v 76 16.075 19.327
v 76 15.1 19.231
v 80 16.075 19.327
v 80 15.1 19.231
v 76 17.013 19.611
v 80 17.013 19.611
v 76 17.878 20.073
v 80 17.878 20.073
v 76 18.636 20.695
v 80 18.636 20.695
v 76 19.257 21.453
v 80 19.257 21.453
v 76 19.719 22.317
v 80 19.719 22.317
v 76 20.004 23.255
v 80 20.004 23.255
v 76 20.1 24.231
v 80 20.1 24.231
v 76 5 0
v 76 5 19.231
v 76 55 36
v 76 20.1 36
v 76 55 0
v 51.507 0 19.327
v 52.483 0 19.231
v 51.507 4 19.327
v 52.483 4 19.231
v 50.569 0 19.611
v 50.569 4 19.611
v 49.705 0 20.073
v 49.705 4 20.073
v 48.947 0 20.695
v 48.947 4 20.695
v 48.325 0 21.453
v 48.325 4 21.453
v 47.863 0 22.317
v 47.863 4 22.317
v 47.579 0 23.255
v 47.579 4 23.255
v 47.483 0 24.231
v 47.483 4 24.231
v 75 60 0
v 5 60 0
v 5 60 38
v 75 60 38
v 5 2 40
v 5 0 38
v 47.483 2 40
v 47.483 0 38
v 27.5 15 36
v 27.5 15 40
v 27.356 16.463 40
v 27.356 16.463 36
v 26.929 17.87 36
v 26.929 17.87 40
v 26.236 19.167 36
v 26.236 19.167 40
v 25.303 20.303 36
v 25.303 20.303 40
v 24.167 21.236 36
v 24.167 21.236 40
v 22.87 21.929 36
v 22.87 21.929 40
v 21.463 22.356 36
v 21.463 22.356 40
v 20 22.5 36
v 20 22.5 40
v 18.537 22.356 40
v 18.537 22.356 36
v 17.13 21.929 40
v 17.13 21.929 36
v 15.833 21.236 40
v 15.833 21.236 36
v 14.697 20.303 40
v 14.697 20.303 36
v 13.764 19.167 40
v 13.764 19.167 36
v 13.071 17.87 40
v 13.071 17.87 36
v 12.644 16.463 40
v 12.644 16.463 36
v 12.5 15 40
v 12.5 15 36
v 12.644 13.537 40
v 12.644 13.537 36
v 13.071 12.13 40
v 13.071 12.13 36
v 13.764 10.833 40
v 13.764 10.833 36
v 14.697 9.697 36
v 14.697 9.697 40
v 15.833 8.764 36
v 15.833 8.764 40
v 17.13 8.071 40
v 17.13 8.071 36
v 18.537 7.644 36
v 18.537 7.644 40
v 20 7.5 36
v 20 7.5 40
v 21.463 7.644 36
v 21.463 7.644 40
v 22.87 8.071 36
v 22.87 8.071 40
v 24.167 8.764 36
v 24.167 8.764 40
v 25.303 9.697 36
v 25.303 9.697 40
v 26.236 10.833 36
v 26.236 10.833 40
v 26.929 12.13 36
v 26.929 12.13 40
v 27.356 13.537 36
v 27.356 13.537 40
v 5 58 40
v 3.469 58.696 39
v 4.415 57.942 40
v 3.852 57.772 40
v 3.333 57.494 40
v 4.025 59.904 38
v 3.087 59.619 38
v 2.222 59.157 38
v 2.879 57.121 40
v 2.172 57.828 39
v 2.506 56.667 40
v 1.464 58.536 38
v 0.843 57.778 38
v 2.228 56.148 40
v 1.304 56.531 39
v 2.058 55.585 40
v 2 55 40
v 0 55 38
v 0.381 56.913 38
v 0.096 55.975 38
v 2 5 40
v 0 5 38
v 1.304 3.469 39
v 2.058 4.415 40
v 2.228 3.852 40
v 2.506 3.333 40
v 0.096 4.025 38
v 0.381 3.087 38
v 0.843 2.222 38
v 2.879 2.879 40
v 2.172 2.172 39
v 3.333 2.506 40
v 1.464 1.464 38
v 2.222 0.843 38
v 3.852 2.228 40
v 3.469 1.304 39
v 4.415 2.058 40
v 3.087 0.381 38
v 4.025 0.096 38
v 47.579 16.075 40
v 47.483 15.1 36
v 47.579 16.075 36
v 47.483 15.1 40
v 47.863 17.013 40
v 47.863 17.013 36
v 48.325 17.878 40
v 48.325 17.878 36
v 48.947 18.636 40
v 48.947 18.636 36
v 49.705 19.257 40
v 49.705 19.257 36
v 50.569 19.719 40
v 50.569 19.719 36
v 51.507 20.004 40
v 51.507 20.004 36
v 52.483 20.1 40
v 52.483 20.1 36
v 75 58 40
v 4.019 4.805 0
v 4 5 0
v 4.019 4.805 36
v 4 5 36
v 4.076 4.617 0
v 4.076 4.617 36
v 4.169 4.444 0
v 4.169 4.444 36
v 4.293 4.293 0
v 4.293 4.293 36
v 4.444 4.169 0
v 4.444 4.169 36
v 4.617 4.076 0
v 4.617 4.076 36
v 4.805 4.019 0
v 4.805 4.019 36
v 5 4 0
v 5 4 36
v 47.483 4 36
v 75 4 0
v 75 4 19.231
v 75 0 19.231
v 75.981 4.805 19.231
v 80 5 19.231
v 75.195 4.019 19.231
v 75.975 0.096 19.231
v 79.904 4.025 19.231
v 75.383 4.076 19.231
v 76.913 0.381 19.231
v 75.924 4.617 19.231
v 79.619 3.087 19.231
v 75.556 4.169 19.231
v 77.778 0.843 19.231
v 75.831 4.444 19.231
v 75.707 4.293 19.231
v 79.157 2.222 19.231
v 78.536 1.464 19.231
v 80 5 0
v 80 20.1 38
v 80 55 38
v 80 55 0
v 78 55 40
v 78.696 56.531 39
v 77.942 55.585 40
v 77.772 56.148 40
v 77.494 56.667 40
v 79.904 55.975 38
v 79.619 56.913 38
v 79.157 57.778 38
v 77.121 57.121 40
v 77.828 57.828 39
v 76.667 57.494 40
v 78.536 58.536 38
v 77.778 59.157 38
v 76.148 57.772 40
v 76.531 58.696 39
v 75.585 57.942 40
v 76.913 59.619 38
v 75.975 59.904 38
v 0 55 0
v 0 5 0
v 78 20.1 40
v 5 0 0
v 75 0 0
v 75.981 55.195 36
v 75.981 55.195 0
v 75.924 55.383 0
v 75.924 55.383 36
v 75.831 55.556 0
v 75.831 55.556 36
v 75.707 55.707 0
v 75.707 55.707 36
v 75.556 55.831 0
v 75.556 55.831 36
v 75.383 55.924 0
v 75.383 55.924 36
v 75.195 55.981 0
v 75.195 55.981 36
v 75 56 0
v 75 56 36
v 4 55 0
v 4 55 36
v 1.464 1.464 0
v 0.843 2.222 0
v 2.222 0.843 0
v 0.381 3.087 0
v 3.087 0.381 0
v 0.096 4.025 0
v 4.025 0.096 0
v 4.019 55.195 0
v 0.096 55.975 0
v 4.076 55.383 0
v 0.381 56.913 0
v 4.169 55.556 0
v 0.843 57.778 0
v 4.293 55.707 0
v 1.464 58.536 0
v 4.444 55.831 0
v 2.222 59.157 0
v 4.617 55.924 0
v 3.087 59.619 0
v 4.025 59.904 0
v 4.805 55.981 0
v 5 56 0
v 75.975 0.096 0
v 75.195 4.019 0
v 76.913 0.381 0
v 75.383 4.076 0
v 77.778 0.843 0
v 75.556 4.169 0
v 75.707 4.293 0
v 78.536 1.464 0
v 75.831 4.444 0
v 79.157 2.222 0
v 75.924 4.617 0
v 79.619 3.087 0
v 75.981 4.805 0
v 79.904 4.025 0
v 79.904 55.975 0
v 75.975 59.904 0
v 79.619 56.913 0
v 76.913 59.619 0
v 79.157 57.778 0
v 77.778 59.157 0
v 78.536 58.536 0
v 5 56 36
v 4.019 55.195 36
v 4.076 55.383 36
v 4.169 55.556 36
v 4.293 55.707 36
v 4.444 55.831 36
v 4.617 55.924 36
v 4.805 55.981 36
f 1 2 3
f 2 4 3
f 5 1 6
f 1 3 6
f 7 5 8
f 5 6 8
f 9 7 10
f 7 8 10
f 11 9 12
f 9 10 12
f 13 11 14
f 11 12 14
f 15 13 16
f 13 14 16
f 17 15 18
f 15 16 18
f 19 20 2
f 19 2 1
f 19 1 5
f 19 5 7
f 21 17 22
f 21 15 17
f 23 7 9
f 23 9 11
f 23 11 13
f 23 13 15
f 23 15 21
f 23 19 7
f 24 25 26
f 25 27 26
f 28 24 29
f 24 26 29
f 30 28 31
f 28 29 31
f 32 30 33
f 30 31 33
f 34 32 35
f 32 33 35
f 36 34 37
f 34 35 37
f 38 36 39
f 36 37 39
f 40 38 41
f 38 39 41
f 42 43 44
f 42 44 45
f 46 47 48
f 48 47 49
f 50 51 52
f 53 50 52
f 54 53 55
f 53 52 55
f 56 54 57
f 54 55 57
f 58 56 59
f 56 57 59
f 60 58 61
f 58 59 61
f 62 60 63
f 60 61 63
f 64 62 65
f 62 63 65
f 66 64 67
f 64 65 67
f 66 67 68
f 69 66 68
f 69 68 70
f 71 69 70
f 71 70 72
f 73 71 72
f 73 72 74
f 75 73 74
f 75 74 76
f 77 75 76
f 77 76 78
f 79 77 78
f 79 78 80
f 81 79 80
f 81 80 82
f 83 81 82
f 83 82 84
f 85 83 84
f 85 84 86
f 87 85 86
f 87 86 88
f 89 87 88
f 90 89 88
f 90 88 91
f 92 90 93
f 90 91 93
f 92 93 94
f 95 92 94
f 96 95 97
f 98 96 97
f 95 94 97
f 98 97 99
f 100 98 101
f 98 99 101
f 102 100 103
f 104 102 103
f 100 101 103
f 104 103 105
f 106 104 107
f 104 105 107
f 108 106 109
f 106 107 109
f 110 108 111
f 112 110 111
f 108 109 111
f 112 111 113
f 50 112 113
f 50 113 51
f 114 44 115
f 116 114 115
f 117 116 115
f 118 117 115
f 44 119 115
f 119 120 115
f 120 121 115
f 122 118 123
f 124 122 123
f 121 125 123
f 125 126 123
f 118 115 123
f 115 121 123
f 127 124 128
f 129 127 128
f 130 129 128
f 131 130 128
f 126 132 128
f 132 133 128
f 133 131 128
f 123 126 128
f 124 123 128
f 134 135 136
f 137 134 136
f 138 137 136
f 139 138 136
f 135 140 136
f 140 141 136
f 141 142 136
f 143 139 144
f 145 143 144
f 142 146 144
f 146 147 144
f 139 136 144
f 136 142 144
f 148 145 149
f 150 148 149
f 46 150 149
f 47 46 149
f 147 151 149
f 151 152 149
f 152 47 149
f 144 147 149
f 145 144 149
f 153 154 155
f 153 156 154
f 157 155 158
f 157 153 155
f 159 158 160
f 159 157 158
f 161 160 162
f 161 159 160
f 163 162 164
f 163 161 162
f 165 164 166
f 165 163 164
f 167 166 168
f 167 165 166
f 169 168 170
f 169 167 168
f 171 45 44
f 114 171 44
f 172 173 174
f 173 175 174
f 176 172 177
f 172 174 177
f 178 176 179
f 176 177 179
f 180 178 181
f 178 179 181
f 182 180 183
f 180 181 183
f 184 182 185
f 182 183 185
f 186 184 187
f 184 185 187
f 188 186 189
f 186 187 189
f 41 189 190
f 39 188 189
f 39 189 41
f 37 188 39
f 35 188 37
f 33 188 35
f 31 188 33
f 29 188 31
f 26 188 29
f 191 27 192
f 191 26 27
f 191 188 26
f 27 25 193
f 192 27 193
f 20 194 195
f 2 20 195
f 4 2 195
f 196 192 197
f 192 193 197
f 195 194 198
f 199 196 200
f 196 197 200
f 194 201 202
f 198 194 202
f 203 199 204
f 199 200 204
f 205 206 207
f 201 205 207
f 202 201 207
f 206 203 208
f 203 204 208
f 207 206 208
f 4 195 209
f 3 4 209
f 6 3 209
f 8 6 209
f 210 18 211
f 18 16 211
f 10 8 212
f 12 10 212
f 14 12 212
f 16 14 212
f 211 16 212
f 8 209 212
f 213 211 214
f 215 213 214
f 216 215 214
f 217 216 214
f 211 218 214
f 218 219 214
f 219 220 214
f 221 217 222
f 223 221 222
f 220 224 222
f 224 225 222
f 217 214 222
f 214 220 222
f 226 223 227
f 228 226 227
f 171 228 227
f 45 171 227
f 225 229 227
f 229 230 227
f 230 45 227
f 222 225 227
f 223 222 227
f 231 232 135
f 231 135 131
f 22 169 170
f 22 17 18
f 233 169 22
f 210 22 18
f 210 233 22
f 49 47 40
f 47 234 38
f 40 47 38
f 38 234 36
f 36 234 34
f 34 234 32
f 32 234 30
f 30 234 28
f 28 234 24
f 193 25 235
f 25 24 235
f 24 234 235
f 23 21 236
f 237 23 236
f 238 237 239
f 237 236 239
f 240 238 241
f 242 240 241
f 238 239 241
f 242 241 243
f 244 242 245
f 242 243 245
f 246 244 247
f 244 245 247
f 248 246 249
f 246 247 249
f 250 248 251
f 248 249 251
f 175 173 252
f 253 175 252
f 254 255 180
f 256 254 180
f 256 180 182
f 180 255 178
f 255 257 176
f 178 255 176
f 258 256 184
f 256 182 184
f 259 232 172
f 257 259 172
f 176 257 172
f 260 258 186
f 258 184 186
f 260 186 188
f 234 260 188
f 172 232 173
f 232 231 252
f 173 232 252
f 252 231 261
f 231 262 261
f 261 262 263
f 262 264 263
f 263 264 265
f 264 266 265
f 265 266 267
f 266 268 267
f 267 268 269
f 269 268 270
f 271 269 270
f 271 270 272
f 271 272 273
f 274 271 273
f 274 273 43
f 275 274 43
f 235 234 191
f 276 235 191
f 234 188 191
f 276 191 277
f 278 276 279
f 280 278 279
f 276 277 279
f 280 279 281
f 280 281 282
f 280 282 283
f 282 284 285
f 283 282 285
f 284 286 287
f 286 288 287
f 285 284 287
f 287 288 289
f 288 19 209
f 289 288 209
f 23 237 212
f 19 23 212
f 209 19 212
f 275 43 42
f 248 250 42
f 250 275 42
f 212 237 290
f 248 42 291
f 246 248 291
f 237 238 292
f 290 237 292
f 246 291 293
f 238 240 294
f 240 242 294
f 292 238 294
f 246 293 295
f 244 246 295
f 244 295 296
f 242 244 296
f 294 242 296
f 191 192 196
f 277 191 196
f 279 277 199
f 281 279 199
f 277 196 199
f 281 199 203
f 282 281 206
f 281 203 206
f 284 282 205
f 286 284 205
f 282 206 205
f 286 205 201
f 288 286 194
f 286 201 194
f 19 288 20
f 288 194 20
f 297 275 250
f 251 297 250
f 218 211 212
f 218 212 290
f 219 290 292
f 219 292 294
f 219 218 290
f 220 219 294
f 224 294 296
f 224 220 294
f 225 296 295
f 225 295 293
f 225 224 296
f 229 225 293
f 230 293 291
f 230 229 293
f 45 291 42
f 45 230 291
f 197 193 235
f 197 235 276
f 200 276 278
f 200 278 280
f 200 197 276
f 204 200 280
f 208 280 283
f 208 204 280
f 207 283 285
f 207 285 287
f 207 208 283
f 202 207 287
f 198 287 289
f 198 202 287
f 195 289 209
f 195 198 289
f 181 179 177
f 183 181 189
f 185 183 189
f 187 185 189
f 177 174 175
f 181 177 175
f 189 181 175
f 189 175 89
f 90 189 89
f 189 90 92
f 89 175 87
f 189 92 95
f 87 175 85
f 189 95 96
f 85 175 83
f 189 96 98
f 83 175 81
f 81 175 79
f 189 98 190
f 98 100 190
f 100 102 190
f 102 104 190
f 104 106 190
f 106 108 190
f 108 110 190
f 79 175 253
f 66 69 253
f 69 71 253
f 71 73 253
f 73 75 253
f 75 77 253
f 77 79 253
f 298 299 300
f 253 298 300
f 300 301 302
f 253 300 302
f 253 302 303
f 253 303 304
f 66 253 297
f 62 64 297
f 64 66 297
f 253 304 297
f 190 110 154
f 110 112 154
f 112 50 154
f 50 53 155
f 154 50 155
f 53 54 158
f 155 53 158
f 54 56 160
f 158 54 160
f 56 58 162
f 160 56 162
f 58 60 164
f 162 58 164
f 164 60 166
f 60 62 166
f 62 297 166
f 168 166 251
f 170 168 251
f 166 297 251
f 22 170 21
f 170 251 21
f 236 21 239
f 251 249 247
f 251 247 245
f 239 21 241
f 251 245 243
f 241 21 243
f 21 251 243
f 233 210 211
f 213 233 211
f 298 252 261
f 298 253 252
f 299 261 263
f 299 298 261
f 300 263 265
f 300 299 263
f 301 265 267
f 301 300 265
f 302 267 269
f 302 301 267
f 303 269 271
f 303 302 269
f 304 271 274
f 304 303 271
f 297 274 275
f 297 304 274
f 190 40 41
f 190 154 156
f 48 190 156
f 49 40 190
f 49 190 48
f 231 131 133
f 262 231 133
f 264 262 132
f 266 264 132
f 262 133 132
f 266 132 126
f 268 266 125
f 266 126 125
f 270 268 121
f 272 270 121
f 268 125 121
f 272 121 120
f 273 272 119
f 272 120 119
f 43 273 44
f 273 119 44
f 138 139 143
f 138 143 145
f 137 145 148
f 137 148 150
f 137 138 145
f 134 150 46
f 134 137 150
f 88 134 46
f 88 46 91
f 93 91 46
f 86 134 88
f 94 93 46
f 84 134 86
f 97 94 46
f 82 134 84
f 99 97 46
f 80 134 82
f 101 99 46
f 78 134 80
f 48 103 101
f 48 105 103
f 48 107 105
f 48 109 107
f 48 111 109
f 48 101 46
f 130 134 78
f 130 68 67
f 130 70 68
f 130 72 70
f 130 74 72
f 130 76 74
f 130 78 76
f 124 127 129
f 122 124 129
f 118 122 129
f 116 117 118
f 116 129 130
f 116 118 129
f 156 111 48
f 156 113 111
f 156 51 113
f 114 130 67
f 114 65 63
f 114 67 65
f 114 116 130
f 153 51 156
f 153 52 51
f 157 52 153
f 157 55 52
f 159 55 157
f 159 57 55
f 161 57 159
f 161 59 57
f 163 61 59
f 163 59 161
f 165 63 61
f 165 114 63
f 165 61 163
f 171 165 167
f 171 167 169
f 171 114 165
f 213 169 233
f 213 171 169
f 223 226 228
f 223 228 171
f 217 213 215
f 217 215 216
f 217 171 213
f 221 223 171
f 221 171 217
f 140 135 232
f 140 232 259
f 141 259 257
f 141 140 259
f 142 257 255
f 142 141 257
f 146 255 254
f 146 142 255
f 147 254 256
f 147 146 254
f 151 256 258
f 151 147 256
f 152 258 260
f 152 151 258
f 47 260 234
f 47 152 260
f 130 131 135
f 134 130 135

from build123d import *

# Parameters (mm, degrees)
F0_W     = 80
F0_H     = 60
F1_DEPTH = 40
F2_R     = 5
F3_SIZE  = 2
F4_T     = -4
F5_R     = 7.5
F6_DEPTH = 40.001
F7_W     = 47.272053
F7_H     = 29.239059
F8_DEPTH = 20.1
F9_R     = 5


with BuildPart() as f1:
    # F0 (on Top) → F1 (new body)
    with BuildSketch(Plane.XY):
        with Locations((40, 30)):
            Rectangle(F0_W, F0_H)
    extrude(amount=F1_DEPTH)

    # F2
    f2_edges = [f1.edges().sort_by_distance(p)[0] for p in [
        (80, 60, 20),
        (80, 0, 20),
        (0, 0, 20),
        (0, 60, 20),
    ]]
    fillet(f2_edges, radius=F2_R)

    # F3
    f3_edges = [f1.edges().sort_by_distance(p)[0] for p in [
        (40, 0, 40),
    ]]
    chamfer(f3_edges, length=F3_SIZE)

    # F4
    f4_openings = [f1.faces().sort_by_distance(p)[0] for p in [
        (40, 30, 0),
    ]]
    offset(amount=F4_T, openings=f4_openings)

    # F5 (on face) → F6 (cut, through all)
    with BuildSketch(Plane.XY.offset(40)):
        with Locations((20, 15)):
            Circle(F5_R)
    extrude(amount=-F6_DEPTH, mode=Mode.SUBTRACT)

    # F7 (on face) → F8 (cut)
    with BuildSketch(Plane.XZ):
        with Locations((71.118602, 33.85017)):
            Rectangle(F7_W, F7_H)
    extrude(amount=-F8_DEPTH, mode=Mode.SUBTRACT)

    # F9
    f9_edges = [f1.edges().sort_by_distance(p)[0] for p in [
        (47.482576, 2, 19.230641),
        (47.482576, 20.1, 38),
        (78, 20.1, 19.230641),
    ]]
    fillet(f9_edges, radius=F9_R)


solid = f1.part
